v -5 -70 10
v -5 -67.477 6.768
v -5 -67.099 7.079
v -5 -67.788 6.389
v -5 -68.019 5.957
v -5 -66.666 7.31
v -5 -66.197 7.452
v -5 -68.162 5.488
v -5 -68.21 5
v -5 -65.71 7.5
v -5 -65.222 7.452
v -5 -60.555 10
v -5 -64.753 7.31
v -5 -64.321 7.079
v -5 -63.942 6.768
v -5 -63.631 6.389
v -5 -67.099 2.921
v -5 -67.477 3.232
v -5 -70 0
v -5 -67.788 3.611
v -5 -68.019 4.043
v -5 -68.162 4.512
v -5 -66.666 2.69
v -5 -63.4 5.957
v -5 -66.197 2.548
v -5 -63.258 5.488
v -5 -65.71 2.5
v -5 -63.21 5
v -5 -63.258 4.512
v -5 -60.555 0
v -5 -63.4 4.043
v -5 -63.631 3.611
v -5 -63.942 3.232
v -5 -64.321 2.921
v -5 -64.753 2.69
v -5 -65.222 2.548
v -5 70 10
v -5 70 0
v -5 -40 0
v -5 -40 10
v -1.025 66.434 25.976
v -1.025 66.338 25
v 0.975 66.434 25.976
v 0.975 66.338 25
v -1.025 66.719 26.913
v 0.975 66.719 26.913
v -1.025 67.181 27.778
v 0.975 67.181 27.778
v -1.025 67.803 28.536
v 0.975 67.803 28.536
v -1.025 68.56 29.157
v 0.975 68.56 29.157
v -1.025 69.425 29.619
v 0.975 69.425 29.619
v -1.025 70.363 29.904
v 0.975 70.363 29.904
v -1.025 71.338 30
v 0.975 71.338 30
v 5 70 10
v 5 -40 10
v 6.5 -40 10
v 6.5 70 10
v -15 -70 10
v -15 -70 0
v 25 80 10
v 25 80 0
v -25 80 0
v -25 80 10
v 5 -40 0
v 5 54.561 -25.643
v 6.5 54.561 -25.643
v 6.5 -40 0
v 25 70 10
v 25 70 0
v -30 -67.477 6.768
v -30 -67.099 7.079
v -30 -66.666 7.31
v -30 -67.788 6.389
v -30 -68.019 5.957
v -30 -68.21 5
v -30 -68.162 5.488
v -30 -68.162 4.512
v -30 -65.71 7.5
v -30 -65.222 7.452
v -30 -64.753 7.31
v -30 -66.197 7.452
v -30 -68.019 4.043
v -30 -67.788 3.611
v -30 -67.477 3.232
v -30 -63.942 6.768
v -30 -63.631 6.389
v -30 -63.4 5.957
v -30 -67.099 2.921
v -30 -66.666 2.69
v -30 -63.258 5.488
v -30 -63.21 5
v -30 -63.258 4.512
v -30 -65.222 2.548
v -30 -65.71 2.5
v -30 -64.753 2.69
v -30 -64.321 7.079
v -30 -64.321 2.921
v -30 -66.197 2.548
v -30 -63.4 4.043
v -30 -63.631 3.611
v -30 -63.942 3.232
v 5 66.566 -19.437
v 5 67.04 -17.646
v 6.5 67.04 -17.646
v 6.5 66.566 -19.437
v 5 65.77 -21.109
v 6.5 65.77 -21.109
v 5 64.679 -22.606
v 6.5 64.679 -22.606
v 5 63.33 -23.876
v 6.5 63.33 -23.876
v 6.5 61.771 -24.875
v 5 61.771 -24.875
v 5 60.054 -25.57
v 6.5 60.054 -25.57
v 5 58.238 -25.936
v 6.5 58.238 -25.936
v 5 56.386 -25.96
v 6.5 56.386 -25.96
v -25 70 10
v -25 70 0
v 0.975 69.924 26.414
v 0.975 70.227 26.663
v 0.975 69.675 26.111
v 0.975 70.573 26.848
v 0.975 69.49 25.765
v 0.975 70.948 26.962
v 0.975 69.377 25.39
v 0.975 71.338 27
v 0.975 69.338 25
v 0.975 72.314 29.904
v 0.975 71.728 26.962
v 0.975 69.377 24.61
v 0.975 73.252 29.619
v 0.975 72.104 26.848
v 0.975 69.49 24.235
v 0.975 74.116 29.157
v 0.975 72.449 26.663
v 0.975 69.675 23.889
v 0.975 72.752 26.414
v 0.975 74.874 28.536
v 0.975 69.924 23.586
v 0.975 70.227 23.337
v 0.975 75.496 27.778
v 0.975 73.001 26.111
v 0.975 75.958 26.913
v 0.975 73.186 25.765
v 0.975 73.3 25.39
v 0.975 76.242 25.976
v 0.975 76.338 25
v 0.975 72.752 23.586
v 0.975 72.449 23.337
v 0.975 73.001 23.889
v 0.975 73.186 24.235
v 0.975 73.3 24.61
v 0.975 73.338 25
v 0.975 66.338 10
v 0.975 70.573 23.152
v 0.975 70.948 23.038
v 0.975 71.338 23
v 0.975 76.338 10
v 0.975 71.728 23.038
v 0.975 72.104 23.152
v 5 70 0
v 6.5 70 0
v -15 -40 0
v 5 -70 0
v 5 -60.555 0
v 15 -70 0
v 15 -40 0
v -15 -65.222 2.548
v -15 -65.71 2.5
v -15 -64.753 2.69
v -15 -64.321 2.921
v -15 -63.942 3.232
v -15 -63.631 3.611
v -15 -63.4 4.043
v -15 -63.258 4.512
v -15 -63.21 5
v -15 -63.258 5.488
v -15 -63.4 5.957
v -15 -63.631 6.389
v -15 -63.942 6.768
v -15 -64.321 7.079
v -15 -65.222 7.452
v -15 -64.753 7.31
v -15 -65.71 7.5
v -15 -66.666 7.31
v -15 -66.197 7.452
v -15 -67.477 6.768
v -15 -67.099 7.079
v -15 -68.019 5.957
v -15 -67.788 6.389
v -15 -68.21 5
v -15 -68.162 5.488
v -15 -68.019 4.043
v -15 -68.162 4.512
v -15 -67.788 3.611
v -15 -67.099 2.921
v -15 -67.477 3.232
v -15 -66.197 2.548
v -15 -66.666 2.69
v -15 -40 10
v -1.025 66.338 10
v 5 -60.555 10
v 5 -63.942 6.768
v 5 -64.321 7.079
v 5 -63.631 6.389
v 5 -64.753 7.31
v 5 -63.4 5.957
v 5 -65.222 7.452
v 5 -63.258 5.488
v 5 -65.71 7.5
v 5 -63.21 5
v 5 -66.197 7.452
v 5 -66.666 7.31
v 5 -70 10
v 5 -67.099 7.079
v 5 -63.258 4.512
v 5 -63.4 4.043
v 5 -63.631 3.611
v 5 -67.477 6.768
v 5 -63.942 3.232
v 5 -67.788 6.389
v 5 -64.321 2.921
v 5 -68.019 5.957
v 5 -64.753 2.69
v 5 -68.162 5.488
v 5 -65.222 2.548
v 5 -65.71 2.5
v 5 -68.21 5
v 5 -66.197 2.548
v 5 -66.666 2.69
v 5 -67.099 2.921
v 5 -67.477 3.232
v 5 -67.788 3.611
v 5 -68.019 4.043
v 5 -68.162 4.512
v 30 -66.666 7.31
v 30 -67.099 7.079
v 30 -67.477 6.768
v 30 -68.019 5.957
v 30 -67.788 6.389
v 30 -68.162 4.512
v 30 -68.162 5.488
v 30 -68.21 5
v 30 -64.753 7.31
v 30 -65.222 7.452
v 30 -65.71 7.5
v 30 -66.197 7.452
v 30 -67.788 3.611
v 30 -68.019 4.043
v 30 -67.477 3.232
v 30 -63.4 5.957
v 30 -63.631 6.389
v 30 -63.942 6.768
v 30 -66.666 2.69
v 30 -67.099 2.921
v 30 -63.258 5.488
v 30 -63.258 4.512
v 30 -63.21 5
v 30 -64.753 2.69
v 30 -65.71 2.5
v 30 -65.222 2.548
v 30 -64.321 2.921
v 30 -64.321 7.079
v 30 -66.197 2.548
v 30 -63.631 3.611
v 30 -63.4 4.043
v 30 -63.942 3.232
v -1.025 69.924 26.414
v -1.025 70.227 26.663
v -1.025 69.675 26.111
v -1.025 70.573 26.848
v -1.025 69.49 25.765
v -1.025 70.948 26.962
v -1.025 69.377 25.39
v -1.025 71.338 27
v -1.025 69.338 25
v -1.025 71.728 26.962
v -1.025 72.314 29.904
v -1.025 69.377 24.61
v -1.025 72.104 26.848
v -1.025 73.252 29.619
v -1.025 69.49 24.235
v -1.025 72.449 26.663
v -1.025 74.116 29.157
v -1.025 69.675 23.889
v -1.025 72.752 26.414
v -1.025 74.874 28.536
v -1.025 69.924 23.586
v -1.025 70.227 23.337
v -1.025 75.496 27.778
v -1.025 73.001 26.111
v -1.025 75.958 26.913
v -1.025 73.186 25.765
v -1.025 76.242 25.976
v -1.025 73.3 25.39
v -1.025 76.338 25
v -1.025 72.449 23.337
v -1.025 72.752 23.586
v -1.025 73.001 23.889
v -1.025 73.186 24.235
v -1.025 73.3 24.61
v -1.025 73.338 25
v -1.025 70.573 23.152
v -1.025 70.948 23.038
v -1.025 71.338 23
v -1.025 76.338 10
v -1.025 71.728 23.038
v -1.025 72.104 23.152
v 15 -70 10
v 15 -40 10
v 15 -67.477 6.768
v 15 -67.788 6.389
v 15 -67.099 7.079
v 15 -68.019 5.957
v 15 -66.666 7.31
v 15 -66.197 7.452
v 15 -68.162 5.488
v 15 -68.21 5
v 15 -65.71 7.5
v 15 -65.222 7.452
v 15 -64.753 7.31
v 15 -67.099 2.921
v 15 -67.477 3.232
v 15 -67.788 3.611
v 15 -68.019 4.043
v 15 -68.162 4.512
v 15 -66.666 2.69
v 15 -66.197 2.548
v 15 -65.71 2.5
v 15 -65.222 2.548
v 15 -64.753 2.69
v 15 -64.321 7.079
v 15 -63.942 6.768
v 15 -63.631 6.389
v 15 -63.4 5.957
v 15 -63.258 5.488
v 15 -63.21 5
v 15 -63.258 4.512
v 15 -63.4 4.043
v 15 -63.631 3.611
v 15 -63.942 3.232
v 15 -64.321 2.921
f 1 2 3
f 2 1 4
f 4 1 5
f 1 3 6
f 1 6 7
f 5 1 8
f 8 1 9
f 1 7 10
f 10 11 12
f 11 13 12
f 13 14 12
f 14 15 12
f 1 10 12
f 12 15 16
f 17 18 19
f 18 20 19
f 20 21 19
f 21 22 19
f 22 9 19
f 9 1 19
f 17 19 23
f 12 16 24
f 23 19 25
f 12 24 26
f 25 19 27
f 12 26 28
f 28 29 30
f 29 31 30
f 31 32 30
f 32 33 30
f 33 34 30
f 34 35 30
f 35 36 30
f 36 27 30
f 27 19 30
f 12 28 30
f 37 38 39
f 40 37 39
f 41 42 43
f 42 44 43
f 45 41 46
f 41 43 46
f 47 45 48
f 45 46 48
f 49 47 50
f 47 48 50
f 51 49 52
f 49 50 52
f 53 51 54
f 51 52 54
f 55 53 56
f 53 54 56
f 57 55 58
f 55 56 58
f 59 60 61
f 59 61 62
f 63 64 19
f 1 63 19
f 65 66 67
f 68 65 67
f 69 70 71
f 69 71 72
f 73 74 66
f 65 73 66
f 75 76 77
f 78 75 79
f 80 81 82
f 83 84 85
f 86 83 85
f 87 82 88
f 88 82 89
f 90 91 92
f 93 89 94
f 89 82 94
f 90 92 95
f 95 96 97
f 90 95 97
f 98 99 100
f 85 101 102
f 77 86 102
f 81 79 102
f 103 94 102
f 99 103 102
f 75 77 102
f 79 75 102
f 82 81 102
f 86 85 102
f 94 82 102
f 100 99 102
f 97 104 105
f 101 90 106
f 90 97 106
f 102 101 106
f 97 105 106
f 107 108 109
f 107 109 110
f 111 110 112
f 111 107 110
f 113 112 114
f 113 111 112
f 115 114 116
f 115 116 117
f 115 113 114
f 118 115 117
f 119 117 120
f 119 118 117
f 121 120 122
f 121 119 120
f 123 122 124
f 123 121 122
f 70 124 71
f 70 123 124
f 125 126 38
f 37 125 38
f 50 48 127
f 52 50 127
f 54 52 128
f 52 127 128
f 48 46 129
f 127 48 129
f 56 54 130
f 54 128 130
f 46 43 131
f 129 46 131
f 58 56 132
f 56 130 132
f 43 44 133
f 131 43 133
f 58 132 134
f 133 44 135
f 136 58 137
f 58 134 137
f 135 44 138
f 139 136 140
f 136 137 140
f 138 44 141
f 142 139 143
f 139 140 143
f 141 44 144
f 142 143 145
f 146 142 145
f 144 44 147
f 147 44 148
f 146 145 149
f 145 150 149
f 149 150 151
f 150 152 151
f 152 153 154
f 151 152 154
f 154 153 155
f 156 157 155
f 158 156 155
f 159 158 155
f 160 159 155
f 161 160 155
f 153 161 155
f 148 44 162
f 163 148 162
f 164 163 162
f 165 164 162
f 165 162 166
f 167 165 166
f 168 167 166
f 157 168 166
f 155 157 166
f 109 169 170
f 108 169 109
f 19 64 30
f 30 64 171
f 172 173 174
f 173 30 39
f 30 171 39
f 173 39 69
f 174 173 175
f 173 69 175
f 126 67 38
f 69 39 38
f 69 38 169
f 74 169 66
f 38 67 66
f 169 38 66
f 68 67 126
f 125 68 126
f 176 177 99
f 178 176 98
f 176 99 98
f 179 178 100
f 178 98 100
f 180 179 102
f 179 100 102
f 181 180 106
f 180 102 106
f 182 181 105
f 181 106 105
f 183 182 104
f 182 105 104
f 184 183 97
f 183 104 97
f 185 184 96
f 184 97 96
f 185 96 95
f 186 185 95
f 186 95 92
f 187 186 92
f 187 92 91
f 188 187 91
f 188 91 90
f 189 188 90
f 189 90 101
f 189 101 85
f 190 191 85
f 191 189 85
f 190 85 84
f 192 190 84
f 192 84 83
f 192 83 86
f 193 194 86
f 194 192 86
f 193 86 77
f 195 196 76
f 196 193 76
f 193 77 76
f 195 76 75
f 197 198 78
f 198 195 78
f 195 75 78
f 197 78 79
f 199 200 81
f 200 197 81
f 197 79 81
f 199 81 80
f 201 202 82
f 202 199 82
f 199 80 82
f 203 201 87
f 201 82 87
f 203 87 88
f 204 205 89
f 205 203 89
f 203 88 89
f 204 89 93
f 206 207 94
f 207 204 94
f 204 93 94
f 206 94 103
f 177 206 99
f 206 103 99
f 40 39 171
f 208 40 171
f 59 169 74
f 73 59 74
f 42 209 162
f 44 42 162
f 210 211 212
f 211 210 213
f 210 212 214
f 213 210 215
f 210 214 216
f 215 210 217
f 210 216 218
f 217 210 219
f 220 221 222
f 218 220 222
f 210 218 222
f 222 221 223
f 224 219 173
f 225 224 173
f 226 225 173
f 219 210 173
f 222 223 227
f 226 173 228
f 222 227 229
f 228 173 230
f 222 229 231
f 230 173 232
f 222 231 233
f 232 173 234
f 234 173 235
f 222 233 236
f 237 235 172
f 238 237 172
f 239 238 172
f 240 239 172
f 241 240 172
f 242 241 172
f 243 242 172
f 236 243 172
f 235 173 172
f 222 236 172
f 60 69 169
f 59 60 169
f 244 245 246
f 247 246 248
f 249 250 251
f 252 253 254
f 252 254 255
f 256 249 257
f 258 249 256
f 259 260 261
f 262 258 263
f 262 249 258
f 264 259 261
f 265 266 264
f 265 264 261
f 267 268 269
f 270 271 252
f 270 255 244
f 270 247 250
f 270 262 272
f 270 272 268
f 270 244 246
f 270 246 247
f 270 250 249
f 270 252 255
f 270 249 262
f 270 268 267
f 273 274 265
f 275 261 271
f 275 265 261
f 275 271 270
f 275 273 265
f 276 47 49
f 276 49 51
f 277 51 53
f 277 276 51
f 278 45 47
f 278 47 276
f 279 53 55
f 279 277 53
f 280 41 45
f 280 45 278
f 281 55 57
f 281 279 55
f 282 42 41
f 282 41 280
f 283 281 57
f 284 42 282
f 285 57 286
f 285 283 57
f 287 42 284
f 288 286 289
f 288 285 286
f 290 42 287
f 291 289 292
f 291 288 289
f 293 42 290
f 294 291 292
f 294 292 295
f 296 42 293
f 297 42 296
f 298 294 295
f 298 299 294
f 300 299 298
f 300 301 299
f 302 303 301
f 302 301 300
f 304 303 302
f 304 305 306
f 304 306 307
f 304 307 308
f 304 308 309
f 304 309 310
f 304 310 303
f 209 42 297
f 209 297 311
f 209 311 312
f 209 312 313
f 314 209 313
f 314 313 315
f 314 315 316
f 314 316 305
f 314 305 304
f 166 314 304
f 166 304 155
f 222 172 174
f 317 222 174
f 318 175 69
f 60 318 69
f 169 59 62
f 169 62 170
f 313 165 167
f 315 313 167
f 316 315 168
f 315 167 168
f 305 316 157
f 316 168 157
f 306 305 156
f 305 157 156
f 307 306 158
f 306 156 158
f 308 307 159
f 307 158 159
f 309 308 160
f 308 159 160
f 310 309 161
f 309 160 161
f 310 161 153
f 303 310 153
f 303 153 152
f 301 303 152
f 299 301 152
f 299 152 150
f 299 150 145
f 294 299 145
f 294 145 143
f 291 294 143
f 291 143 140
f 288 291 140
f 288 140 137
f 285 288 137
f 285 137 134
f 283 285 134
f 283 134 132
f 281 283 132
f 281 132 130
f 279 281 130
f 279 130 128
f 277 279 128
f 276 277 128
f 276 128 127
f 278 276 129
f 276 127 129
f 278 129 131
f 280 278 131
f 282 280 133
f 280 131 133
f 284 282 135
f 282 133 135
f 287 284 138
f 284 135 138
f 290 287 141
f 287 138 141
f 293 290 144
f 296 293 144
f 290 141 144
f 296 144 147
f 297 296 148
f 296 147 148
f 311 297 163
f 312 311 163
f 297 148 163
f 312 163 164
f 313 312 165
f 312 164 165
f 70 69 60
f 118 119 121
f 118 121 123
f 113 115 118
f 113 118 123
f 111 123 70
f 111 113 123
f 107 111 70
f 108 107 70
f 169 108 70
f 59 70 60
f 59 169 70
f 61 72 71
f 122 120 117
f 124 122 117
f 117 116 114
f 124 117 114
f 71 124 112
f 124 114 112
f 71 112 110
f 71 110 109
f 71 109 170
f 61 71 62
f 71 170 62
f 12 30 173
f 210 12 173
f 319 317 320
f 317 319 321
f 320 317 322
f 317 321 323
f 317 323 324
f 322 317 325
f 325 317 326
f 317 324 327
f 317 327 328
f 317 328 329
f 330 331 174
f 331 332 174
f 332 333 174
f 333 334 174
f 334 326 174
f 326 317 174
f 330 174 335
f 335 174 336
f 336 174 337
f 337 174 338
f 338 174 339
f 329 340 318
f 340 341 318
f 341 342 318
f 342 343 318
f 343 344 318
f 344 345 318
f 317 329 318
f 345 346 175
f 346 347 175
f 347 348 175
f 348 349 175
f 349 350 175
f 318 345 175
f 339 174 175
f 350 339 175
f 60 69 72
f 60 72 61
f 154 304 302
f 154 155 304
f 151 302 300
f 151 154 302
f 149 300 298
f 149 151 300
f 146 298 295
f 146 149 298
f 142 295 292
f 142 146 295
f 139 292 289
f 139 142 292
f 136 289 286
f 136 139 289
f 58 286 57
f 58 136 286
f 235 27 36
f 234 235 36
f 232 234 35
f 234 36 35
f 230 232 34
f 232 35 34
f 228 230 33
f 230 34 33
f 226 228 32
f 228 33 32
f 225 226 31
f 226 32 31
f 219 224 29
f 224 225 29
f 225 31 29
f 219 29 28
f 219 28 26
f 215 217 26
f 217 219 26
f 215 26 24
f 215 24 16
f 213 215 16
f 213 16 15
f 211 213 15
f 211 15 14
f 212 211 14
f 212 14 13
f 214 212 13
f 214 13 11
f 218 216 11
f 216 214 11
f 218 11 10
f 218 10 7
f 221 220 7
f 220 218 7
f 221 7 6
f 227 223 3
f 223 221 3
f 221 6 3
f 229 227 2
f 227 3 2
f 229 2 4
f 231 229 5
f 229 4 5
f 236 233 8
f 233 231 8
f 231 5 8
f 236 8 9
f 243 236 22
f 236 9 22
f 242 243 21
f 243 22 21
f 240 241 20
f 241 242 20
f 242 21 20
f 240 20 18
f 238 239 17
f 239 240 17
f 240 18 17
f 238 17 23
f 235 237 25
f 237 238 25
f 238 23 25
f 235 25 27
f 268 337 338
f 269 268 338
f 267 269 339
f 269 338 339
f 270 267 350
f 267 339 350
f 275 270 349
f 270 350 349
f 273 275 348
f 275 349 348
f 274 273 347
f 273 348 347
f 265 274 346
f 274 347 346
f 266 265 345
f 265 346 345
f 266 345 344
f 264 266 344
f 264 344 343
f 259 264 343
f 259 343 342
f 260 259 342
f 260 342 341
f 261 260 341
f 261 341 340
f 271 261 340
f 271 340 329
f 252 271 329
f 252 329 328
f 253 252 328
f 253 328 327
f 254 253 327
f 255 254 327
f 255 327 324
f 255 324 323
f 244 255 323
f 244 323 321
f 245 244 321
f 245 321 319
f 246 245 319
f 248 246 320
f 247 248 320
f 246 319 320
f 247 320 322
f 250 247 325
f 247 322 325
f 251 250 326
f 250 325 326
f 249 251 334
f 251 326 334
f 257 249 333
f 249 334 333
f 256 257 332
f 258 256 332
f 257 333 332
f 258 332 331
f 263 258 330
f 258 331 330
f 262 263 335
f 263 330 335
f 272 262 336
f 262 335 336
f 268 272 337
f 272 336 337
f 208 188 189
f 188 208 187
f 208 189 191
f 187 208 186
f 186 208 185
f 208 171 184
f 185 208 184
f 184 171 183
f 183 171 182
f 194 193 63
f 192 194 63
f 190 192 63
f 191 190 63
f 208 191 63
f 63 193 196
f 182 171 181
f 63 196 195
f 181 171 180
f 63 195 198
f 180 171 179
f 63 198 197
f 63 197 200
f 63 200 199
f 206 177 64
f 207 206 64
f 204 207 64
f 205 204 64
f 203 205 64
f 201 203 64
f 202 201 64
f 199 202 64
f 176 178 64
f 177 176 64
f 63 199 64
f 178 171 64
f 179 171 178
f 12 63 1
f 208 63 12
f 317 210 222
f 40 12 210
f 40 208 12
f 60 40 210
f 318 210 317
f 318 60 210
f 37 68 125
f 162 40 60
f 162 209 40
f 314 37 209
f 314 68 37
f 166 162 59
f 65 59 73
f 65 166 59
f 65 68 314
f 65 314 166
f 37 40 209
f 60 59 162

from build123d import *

# Parameters (mm, degrees)
BOSS_EXTRUDE1_DEPTH      = 10
SKETCH5_W                = 2
SKETCH5_H                = 10
BOSS_EXTRUDE2_DEPTH      = 20
FILLET1_R                = 5
SKETCH6_R                = 2
CUT_EXTRUDE2_DEPTH       = 20
BOSS_EXTRUDE3_DEPTH      = 1.5
BOSS_EXTRUDE4_DEPTH      = 15
BOSS_EXTRUDE4_DEPTH_BACK = 45
SKETCH2_R                = 2.5


with BuildPart() as part:
    # Sketch1 → Boss-Extrude1 (new body)
    with BuildSketch(Plane.XY):
        Polygon((-5, 70), (5, 70), (25, 70), (25, 80), (-25, 80), (-25, 70), align=None)
        Polygon((5, -60.555274141), (5, -40), (5, 70), (-5, 70), (-5, -40), (-5, -60.555274141), align=None)
        Polygon((-5, -70), (-5, -60.555274141), (-5, -40), (-15, -40), (-15, -70), align=None)
        Polygon((5, -70), (15, -70), (15, -40), (5, -40), (5, -60.555274141), align=None)
    extrude(amount=BOSS_EXTRUDE1_DEPTH)

    # Sketch5 → Boss-Extrude2 (add)
    with BuildSketch(Plane.XY.offset(10)):
        with Locations((-0.025385346, 71.338218607)):
            Rectangle(SKETCH5_W, SKETCH5_H)
    extrude(amount=BOSS_EXTRUDE2_DEPTH)

    # Fillet1
    fillet1_edges = [part.edges().sort_by_distance(p)[0] for p in [
        (-0.025385346, 66.338218607, 30),
        (-0.025385346, 76.338218607, 30),
    ]]
    fillet(fillet1_edges, radius=FILLET1_R - 0.0001)  # a hair under: the kernel refuses the full size

    # Sketch6 → Cut-Extrude2 (cut)
    with BuildSketch(Plane(origin=(0.974614654, 0, 0), x_dir=(0, 0, -1), z_dir=(1, 0, 0))):
        with Locations((-25, 71.338218607)):
            Circle(SKETCH6_R)
    extrude(amount=-CUT_EXTRUDE2_DEPTH, mode=Mode.SUBTRACT)

    # Sketch2 → Boss-Extrude4 (add, two sides: drawn at the far end of the back side and taken through both)
    with BuildSketch(Plane(origin=(15, 0, 0), x_dir=(0, 0, -1), z_dir=(1, 0, 0)).offset(-BOSS_EXTRUDE4_DEPTH_BACK)):
        with Locations((-5, -65.709613715)):
            Circle(SKETCH2_R)
    extrude(amount=BOSS_EXTRUDE4_DEPTH + BOSS_EXTRUDE4_DEPTH_BACK)


with BuildPart() as body_2:
    # Sketch7 → Boss-Extrude3 (new body)
    with BuildSketch(Plane(origin=(5, 0, 0), x_dir=(0, 0, -1), z_dir=(1, 0, 0))):
        with BuildLine():
            Line((0, 70), (17.646012218, 67.040408019))
            ThreePointArc((17.646012218, 67.040408019), (24.41144088, 62.573672726), (25.643325146, 54.560857346))
            Line((25.643325146, 54.560857346), (0, -40))
            Line((0, -40), (-10, -40))
            Line((-10, -40), (-10, 70))
            Line((-10, 70), (0, 70))
        make_face()
    extrude(amount=BOSS_EXTRUDE3_DEPTH)


solid = Compound([part.part, body_2.part])
